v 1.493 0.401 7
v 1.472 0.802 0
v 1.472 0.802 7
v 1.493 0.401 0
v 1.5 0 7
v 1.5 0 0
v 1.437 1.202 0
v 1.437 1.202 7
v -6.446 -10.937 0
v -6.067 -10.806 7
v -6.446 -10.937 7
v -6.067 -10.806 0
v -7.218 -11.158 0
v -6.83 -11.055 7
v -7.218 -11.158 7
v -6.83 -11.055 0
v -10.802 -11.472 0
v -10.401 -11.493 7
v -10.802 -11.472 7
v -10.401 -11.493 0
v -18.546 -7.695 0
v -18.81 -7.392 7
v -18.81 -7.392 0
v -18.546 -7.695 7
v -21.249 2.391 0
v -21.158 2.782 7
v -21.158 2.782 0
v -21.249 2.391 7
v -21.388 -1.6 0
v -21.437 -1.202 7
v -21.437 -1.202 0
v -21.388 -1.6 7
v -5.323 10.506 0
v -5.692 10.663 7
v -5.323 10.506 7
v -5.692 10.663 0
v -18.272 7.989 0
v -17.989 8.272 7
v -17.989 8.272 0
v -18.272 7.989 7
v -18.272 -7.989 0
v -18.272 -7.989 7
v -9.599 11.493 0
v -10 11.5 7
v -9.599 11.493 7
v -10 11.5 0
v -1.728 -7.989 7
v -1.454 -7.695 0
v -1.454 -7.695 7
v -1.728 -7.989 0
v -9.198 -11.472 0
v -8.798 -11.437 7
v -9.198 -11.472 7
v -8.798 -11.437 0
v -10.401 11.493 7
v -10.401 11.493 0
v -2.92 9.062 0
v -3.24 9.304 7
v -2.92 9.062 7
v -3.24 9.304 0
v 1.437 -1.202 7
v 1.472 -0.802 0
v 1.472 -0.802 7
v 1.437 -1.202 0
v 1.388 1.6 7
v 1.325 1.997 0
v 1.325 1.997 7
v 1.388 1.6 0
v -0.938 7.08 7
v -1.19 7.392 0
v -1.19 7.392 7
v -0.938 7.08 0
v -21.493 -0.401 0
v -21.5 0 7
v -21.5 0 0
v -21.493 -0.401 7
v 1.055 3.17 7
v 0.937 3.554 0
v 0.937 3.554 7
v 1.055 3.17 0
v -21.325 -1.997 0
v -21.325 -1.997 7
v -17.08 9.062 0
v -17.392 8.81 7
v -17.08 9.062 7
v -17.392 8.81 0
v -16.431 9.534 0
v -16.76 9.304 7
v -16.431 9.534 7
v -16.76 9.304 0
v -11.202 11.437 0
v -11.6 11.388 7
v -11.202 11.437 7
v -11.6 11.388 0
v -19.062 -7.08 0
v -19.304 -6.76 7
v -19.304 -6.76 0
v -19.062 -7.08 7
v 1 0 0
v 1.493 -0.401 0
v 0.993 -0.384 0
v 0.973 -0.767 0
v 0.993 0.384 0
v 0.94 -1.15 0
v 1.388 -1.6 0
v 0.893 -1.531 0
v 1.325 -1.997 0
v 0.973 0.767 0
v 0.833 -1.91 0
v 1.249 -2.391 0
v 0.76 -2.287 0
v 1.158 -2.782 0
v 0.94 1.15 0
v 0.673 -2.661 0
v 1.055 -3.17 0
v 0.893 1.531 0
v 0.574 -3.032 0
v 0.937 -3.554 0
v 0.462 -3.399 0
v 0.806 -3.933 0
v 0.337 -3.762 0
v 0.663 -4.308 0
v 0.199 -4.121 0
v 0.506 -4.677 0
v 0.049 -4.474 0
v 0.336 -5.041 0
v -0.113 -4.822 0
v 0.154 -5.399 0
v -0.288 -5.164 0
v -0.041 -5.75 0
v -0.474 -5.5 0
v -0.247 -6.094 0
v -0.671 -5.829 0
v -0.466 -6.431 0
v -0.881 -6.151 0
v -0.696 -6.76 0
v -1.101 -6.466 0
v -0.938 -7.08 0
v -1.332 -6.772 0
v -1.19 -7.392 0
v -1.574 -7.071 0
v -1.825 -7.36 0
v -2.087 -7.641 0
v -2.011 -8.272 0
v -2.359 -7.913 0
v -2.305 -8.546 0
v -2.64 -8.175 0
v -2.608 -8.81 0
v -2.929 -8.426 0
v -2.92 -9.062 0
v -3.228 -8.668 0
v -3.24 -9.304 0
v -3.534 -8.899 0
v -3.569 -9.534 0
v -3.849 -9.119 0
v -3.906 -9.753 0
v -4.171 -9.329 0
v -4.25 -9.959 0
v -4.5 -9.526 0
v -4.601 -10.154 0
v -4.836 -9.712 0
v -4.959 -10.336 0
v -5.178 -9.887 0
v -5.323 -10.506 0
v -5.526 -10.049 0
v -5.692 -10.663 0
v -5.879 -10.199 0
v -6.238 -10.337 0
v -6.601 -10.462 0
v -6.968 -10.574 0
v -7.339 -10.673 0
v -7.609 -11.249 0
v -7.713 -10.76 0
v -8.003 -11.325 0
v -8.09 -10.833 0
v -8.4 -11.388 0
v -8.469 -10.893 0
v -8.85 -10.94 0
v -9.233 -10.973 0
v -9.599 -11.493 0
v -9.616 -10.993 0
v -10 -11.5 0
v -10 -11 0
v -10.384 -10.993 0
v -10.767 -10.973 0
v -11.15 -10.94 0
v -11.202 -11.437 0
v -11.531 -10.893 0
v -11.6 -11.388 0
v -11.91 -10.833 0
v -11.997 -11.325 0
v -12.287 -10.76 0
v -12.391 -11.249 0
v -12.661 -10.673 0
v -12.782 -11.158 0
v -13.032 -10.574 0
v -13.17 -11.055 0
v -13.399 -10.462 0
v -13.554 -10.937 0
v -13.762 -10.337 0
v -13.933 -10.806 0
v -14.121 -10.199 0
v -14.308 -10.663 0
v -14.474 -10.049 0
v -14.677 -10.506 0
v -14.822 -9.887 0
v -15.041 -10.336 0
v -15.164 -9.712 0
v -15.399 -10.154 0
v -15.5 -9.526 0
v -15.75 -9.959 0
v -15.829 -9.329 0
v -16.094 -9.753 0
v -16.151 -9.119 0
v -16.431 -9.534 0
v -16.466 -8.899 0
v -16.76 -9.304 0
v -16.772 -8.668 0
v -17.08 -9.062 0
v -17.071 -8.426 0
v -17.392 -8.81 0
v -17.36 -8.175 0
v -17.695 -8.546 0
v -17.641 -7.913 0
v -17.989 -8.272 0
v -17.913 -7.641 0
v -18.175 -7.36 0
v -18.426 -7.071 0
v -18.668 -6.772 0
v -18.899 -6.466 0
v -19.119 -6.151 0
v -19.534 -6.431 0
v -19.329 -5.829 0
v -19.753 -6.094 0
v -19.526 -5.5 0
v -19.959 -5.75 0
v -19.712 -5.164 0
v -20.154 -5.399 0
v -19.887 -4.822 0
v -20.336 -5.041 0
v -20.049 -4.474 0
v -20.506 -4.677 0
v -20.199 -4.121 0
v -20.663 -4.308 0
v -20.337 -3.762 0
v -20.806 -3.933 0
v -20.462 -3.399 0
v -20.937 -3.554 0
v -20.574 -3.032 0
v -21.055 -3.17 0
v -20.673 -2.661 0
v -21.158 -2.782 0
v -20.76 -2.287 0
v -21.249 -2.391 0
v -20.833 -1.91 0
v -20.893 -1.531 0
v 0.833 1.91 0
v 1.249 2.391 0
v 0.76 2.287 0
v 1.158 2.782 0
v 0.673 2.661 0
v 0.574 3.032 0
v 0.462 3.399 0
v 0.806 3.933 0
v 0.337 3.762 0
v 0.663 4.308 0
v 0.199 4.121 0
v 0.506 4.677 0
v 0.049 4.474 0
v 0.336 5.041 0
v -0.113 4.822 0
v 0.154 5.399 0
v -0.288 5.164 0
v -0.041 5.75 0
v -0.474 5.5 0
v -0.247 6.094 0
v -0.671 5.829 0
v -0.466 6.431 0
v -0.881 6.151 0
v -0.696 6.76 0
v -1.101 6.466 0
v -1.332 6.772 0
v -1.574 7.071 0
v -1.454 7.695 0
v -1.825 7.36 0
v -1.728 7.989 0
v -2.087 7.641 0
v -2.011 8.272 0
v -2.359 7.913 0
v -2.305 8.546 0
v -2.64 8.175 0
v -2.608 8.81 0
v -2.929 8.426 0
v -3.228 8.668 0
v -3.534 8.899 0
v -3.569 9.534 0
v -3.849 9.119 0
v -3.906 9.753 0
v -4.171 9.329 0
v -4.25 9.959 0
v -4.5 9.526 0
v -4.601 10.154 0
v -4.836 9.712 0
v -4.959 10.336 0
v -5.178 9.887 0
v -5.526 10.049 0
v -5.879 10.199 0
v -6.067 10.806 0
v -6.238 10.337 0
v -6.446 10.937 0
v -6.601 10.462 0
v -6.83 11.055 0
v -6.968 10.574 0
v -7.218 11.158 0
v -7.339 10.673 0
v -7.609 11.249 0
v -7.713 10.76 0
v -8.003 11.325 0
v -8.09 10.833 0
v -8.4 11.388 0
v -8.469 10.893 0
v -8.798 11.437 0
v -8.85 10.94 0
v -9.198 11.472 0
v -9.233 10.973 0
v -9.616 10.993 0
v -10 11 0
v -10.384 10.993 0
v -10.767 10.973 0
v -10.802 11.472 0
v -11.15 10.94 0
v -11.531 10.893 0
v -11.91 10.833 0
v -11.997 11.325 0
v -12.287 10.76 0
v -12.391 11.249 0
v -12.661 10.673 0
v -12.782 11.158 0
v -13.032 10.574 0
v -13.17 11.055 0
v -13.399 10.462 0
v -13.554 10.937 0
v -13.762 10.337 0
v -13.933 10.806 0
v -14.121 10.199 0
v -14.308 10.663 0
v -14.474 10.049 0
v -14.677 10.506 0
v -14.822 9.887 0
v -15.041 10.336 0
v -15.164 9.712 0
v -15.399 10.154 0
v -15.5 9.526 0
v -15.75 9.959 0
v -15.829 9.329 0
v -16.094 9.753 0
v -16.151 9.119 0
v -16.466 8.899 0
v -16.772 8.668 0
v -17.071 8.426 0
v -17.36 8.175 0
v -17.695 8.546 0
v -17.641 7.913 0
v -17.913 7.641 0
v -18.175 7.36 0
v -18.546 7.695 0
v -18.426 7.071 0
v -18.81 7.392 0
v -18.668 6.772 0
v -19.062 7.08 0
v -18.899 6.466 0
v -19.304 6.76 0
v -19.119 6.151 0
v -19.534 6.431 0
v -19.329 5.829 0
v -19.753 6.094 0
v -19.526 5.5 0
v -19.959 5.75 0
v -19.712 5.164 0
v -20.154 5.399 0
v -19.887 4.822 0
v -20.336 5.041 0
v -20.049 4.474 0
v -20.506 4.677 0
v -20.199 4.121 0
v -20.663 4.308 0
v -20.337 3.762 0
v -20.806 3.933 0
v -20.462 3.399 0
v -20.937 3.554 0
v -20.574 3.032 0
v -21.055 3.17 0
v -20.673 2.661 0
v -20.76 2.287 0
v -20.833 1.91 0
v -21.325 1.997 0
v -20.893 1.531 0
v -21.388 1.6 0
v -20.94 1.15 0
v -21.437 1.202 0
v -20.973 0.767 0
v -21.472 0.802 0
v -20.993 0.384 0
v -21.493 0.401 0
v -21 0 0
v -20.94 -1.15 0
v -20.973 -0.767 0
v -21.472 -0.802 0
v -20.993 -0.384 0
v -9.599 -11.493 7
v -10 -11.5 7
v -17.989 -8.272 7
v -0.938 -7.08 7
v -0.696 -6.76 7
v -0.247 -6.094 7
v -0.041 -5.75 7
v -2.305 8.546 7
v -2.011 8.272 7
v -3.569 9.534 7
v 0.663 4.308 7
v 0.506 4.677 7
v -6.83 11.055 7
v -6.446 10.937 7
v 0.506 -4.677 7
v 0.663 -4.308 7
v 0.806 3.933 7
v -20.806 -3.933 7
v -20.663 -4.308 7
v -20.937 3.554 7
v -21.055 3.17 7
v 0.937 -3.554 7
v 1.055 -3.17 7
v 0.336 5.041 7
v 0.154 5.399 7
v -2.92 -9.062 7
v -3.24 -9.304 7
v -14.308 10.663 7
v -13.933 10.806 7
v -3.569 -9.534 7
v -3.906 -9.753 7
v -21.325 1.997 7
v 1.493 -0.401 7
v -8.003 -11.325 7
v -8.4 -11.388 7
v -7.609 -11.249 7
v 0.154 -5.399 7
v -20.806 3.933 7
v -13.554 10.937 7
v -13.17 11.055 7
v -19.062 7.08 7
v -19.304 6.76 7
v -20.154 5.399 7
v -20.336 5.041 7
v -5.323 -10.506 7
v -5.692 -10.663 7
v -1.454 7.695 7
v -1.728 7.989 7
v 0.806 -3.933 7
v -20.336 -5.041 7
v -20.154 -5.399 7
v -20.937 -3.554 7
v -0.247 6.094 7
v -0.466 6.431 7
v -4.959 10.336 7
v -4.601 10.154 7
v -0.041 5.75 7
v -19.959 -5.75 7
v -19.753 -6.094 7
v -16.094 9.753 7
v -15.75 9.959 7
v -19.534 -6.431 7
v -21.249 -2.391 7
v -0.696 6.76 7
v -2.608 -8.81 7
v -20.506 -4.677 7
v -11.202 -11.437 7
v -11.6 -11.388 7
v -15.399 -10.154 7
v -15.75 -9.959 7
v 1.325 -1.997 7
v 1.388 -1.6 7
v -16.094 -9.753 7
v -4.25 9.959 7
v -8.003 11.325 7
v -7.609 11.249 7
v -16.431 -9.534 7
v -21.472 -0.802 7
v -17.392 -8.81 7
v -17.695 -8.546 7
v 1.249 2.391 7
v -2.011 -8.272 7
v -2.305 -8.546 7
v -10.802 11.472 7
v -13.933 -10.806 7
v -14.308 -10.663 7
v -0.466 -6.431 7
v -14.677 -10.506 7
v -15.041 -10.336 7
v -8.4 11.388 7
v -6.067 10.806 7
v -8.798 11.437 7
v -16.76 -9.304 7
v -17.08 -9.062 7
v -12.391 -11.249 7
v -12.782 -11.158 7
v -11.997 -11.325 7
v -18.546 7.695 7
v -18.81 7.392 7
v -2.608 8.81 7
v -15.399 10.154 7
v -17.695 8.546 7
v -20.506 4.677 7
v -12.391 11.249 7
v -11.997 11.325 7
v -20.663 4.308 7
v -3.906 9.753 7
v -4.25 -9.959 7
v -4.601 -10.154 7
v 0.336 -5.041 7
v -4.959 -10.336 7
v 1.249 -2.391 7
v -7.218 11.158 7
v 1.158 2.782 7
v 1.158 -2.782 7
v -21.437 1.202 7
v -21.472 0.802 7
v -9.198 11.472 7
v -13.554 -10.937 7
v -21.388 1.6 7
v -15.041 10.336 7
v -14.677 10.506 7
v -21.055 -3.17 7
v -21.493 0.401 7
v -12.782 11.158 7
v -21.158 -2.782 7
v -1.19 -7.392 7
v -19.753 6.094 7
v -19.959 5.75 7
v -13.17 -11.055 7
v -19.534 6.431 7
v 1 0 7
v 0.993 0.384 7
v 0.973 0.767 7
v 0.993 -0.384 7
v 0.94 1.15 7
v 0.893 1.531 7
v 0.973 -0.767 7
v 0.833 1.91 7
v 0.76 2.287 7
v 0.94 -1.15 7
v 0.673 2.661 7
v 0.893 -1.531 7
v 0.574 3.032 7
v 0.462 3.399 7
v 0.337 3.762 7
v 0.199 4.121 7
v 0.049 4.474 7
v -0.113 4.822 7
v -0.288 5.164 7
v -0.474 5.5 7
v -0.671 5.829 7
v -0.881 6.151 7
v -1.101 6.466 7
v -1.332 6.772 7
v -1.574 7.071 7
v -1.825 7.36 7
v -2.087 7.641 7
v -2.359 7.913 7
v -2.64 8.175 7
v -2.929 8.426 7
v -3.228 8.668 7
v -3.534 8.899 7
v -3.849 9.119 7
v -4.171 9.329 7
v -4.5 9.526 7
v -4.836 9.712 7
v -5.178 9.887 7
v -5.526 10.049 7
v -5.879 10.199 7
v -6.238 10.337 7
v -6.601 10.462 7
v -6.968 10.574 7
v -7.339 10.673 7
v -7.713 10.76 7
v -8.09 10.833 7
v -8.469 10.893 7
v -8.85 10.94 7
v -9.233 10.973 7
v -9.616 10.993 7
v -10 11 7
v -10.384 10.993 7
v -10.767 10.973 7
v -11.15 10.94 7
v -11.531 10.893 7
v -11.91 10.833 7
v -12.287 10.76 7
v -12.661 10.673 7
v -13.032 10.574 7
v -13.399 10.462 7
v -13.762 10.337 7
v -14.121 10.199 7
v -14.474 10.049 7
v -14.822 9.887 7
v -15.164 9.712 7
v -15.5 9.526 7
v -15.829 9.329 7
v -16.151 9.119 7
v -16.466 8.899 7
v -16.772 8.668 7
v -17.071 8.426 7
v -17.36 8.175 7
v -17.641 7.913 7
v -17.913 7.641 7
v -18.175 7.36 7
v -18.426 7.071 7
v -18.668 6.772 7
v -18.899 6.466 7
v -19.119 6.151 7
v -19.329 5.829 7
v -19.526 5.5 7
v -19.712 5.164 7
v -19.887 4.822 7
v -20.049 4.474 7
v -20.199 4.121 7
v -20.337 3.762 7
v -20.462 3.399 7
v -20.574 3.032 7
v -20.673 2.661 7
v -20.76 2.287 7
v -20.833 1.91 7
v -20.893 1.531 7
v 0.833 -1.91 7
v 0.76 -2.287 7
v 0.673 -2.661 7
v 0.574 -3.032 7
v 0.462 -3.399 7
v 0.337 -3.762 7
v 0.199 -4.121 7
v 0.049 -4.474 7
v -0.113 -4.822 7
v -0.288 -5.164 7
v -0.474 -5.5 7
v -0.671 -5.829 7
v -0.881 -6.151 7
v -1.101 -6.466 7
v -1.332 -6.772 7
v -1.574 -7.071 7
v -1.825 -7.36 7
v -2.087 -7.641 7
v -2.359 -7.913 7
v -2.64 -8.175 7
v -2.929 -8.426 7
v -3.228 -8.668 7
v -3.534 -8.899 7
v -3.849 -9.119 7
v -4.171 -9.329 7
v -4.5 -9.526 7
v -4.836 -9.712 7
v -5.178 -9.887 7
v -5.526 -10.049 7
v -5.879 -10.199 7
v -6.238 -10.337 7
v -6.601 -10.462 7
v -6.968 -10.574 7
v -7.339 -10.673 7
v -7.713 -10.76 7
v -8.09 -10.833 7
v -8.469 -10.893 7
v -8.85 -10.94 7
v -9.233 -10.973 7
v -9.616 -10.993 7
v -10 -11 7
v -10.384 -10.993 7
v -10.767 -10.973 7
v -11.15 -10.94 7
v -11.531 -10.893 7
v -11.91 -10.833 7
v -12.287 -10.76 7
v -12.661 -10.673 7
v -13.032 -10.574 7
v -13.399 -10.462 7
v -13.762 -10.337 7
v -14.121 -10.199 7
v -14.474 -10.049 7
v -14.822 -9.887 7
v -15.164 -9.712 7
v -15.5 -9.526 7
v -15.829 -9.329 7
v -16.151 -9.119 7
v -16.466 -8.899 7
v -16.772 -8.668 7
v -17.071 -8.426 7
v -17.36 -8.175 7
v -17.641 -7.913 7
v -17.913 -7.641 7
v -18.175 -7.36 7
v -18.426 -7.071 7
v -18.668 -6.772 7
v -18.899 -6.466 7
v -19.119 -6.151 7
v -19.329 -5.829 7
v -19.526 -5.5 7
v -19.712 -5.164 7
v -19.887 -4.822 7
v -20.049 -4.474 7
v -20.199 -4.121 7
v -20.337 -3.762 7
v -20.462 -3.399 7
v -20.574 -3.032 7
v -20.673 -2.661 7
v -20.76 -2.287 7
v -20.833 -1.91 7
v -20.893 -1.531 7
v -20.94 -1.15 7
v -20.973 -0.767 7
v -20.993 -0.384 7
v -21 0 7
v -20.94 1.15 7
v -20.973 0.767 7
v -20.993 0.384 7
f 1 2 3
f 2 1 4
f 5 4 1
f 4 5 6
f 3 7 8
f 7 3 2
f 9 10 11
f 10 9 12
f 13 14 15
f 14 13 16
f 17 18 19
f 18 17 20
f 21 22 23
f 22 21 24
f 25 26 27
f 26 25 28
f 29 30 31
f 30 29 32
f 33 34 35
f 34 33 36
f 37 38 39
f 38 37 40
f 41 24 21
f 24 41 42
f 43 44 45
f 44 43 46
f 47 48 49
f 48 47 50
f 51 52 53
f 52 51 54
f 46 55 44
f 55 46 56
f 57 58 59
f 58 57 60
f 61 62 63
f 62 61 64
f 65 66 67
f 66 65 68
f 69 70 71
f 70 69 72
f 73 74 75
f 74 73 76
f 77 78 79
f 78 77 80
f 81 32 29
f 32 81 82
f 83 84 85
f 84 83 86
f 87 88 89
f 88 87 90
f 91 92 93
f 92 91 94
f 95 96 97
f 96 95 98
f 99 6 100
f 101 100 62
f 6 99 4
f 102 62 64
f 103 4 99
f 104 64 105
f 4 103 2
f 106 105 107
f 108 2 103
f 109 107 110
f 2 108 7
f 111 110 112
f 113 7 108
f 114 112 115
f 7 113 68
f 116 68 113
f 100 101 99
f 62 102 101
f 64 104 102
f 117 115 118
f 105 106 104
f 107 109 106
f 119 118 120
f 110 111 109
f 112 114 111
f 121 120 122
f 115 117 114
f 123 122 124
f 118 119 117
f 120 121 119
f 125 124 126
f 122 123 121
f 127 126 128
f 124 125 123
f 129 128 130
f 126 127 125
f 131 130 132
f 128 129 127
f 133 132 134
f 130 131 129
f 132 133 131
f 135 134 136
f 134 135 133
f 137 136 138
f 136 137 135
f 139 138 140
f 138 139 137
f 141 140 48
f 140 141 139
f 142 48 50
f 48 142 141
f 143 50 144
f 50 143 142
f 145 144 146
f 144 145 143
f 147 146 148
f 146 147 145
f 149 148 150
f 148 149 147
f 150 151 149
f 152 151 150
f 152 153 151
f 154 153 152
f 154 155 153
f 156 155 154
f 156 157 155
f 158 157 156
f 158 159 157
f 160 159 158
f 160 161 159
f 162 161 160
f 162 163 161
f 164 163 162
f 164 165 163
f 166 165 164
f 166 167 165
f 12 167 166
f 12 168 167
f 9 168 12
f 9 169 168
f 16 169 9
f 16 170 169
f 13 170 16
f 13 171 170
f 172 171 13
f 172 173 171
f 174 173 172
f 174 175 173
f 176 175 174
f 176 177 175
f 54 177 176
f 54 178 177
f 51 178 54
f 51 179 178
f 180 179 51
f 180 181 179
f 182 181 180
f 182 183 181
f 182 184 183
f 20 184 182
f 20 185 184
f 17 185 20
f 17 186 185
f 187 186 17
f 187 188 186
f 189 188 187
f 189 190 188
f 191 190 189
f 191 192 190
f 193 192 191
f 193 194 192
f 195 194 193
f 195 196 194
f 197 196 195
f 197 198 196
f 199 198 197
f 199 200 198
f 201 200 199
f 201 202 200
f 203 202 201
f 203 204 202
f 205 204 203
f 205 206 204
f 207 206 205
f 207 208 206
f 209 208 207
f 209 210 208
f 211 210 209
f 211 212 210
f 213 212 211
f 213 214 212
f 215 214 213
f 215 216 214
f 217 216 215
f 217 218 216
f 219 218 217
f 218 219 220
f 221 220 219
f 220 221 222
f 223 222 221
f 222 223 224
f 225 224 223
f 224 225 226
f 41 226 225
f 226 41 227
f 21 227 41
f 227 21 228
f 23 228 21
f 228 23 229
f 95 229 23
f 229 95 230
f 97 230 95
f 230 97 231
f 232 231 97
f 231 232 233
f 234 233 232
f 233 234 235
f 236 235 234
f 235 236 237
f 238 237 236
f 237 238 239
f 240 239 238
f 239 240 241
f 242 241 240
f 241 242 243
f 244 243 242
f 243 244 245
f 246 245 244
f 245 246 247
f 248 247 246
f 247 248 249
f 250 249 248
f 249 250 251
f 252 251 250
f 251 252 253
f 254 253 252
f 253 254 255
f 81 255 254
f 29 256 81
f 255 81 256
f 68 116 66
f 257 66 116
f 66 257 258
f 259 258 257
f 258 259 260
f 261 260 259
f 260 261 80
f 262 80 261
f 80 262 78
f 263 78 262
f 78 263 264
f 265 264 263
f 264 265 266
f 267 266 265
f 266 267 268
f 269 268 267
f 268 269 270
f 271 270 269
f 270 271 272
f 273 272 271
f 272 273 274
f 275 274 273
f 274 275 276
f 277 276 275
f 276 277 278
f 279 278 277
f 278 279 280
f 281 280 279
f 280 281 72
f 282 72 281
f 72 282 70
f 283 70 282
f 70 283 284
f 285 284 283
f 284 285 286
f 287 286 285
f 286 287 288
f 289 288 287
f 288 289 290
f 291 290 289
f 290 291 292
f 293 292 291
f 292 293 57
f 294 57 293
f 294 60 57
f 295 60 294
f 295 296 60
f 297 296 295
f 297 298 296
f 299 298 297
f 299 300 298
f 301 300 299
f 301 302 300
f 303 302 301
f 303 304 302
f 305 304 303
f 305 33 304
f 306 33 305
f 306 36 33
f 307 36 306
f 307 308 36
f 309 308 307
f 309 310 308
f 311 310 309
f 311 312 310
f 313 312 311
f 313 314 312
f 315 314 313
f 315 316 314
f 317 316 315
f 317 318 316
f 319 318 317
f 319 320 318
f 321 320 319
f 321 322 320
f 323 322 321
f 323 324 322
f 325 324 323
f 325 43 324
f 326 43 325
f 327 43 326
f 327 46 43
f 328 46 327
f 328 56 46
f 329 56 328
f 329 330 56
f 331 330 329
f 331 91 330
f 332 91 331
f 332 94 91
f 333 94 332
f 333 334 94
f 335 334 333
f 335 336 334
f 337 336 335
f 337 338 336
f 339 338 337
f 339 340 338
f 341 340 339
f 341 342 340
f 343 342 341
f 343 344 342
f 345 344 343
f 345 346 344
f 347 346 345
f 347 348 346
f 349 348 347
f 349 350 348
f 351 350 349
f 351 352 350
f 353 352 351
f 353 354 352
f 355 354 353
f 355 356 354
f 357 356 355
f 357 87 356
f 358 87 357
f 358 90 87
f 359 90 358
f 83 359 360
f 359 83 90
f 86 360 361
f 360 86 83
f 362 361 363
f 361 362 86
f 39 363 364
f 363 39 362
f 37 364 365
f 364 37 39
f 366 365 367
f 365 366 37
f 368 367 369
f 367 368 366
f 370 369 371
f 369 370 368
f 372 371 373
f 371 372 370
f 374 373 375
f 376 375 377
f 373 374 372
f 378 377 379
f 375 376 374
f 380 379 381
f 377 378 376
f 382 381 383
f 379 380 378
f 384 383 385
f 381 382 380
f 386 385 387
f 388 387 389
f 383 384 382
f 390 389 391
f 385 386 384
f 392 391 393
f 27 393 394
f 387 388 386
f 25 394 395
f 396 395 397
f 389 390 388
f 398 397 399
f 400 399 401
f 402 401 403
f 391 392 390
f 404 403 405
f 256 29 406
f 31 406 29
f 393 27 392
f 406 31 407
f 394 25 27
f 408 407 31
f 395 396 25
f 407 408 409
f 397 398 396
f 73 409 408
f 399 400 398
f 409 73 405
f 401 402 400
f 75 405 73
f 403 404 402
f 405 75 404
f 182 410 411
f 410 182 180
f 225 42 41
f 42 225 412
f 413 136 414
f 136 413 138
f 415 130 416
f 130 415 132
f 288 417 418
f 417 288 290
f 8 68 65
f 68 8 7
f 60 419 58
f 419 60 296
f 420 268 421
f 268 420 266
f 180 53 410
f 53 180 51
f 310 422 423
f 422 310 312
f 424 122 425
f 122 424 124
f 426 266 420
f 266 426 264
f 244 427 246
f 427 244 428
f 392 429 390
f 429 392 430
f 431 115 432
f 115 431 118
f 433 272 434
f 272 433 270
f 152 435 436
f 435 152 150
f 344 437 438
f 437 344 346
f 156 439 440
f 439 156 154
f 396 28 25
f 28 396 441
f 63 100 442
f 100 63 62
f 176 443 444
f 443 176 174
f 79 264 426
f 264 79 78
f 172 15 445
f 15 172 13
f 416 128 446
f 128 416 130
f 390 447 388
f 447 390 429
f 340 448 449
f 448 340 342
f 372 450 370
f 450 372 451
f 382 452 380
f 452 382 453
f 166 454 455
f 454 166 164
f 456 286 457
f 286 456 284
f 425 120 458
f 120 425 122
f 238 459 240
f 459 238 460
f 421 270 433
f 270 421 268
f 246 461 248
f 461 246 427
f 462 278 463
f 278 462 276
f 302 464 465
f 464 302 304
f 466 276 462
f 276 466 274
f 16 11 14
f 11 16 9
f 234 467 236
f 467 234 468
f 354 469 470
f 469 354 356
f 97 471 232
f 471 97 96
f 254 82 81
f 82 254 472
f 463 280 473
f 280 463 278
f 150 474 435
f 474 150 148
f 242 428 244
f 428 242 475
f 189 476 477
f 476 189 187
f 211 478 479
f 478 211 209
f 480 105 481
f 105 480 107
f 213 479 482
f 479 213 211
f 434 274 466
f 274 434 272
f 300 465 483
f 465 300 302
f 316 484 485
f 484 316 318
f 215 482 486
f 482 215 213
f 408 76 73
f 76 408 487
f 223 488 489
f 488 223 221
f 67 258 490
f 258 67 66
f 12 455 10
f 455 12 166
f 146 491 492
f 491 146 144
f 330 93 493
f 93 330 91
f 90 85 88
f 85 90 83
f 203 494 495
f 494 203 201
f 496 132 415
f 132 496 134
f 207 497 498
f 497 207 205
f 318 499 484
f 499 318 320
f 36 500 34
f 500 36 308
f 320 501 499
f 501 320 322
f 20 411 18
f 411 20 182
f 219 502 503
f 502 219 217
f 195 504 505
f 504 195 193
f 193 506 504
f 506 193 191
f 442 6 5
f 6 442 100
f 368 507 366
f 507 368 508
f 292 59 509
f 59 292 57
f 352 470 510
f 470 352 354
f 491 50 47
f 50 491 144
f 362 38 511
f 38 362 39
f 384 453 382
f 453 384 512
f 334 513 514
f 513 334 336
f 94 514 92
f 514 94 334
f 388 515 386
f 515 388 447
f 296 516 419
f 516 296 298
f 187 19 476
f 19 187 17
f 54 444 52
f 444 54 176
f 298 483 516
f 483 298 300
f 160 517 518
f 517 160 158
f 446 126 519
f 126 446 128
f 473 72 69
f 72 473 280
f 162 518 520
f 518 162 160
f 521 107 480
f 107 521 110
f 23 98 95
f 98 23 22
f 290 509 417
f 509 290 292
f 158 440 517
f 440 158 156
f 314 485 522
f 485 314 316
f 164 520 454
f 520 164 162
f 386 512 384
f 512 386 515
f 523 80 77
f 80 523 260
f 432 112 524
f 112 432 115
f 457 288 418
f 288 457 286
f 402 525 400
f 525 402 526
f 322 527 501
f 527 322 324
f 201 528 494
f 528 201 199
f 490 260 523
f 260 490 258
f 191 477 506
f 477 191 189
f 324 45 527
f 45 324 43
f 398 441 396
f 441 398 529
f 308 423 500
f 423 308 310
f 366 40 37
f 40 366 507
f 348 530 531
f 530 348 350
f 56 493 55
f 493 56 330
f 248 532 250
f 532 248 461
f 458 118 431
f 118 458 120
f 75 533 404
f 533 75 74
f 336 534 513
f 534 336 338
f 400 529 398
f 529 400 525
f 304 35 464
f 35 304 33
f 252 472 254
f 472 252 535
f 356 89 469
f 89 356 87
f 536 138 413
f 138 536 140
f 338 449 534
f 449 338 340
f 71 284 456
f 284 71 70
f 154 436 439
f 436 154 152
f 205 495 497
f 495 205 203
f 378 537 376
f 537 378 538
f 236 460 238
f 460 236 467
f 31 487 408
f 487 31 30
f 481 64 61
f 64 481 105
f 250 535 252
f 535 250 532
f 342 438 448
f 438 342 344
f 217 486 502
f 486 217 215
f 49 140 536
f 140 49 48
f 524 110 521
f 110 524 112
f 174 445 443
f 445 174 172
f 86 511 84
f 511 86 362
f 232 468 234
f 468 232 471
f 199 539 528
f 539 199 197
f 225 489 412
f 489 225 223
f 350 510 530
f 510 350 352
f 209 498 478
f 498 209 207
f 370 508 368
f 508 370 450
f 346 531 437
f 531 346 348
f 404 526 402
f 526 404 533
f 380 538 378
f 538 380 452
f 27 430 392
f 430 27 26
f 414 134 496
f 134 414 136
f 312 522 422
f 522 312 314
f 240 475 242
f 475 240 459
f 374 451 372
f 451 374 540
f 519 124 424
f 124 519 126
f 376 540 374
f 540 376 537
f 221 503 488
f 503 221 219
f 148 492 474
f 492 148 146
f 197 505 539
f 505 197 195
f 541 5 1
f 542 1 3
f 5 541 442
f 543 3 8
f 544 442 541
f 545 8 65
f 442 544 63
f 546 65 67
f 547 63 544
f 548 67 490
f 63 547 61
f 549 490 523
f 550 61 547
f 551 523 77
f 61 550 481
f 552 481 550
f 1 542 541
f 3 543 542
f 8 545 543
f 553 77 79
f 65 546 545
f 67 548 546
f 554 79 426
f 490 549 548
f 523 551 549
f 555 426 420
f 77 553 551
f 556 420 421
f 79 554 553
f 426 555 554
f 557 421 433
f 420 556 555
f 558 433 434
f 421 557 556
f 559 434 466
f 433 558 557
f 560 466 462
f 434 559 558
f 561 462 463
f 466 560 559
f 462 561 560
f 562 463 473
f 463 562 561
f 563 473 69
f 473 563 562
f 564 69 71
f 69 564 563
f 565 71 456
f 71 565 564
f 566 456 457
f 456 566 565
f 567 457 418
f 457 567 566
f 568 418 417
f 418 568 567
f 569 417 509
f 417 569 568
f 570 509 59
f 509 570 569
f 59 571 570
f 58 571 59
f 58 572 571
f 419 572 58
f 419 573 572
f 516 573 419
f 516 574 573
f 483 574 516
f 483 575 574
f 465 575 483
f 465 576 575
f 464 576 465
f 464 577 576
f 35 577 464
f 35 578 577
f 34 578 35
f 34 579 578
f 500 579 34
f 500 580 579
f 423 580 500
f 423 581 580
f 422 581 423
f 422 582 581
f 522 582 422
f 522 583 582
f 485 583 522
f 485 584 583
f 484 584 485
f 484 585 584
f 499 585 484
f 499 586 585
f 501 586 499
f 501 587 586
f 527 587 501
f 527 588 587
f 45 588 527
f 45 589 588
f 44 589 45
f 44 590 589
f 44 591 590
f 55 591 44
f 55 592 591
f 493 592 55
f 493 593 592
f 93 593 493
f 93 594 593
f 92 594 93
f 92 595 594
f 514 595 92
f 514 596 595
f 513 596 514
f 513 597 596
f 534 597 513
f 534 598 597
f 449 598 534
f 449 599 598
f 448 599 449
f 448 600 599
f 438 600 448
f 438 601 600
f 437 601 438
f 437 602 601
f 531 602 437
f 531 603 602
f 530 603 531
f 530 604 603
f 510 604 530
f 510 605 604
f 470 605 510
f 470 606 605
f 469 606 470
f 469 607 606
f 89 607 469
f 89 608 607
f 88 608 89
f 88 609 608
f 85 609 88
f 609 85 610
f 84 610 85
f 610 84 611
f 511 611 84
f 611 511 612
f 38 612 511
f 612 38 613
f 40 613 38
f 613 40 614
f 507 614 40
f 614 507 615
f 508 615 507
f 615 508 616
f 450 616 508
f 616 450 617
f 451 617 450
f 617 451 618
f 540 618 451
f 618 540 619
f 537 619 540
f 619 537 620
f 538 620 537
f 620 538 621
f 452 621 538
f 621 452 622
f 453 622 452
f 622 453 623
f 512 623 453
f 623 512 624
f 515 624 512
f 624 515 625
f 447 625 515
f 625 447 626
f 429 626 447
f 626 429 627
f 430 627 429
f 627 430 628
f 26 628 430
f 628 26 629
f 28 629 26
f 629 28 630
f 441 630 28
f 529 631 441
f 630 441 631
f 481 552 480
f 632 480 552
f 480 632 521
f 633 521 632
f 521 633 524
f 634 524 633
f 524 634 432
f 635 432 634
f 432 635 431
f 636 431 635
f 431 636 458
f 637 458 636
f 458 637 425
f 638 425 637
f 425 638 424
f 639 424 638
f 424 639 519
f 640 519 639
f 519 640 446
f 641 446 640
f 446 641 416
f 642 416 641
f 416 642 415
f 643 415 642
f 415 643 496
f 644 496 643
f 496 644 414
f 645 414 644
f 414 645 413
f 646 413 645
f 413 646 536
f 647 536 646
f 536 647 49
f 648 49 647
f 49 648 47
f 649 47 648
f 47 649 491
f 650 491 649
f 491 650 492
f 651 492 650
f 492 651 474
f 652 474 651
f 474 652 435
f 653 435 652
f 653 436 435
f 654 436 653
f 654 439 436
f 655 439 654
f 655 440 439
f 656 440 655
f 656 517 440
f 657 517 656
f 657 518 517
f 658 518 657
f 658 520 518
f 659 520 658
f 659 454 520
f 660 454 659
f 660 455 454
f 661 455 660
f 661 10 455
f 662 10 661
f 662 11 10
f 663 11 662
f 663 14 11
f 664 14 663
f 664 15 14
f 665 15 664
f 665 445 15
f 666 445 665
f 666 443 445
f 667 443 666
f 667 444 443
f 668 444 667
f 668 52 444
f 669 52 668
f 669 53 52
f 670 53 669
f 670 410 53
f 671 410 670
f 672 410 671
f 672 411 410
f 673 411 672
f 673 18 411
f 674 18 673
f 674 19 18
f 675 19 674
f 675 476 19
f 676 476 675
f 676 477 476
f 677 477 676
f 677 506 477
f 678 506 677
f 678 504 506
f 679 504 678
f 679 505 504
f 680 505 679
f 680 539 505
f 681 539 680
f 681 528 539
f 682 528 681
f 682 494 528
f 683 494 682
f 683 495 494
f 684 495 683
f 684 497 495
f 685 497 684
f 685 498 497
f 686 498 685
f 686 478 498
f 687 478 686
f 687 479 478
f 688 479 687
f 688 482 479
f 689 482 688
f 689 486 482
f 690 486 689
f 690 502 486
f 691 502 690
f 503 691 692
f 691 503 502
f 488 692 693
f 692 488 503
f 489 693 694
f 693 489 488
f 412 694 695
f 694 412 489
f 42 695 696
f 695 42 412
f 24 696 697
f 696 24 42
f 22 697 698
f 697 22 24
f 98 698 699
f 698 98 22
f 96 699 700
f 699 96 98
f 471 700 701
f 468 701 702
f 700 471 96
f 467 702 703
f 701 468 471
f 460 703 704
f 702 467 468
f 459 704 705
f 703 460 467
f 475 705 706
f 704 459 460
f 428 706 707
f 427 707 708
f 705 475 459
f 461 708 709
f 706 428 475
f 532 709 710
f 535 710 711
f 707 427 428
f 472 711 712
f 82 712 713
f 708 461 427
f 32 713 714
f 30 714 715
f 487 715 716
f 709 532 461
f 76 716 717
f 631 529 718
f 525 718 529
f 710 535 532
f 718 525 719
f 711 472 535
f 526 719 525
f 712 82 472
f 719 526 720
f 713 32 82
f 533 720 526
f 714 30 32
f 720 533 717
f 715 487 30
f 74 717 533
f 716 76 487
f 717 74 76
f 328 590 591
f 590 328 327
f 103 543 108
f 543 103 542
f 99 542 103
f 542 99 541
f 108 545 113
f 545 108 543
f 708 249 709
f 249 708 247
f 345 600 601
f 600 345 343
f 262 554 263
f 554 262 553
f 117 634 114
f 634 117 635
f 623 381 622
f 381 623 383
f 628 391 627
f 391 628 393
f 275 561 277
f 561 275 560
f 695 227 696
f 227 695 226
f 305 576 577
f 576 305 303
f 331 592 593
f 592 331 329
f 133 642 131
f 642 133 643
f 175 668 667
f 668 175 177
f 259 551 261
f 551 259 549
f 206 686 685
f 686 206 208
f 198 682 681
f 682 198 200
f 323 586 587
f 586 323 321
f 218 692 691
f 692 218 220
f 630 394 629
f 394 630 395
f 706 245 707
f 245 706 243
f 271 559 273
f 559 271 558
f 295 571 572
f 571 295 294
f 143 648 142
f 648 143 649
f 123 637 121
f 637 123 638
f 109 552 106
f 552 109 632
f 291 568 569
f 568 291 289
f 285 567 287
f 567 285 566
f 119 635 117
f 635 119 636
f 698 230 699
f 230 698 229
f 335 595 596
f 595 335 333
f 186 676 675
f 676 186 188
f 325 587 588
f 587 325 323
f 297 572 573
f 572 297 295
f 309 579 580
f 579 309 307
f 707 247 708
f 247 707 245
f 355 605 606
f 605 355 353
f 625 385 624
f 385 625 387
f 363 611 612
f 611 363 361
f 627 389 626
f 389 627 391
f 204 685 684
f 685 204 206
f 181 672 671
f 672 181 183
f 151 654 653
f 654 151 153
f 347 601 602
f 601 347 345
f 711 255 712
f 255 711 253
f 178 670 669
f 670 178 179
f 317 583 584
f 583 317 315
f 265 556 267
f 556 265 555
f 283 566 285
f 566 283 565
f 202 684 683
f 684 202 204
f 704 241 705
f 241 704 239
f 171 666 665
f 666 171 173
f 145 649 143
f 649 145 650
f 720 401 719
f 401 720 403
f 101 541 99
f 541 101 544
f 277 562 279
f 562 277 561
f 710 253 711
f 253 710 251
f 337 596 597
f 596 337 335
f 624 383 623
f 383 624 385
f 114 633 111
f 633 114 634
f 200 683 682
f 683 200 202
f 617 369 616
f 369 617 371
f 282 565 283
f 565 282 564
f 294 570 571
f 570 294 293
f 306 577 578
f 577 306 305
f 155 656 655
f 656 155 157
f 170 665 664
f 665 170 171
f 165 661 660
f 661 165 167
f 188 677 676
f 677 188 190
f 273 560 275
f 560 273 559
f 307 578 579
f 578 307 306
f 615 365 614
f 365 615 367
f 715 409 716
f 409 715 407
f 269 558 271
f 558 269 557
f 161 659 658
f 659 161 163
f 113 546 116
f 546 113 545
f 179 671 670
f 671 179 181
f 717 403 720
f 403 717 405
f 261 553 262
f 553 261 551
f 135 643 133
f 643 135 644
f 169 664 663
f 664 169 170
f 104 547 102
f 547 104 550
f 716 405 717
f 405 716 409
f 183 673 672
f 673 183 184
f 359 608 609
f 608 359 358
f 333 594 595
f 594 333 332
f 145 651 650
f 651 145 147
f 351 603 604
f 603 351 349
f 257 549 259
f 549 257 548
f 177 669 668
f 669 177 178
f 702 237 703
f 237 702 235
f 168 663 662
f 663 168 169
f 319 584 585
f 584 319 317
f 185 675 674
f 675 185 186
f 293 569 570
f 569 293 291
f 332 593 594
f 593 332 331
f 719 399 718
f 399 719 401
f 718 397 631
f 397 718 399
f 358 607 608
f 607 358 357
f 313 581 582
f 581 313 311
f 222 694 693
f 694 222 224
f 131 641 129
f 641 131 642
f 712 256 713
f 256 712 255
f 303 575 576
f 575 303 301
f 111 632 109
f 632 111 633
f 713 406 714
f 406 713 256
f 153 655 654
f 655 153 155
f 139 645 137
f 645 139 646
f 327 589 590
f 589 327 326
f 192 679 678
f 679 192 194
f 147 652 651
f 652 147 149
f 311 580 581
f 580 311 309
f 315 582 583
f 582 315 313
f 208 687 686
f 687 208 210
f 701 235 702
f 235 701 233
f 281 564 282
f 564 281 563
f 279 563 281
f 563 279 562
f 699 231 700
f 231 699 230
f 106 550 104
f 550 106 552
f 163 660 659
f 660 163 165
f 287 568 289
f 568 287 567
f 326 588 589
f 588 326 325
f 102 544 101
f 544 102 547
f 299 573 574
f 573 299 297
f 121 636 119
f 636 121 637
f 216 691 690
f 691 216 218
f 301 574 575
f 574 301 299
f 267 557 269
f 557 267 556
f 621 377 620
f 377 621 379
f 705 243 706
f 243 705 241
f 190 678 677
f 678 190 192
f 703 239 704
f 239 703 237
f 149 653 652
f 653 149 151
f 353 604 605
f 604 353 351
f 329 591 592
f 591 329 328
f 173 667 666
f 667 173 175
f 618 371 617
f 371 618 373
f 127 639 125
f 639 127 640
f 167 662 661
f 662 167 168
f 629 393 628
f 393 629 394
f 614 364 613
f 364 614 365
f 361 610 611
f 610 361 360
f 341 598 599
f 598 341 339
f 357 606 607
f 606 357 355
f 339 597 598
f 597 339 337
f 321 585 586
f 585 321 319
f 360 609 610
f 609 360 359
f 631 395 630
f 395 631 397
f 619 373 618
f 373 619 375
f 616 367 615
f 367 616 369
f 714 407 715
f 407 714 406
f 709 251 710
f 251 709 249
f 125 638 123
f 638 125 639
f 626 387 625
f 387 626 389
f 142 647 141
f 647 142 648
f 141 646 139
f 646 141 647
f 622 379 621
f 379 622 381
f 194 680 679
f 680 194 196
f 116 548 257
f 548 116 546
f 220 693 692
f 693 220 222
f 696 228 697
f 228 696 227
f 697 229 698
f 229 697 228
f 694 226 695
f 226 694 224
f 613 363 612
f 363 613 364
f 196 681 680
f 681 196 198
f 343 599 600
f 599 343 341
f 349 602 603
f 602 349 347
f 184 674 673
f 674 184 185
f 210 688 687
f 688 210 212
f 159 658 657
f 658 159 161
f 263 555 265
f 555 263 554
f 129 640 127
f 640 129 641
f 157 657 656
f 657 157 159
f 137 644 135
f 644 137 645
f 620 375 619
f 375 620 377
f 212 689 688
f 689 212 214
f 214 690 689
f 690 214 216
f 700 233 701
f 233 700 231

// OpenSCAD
// bearing holder

$fn=180;

/*
translate([10,0,0]) {
    difference() {
        cylinder(7, d=8);
        cylinder(7, d=4.5);
    }
}
*/

translate([-10,0,0]) {
    difference() {
        cylinder(7, d=23);
        cylinder(7, d=22);
    }
}
